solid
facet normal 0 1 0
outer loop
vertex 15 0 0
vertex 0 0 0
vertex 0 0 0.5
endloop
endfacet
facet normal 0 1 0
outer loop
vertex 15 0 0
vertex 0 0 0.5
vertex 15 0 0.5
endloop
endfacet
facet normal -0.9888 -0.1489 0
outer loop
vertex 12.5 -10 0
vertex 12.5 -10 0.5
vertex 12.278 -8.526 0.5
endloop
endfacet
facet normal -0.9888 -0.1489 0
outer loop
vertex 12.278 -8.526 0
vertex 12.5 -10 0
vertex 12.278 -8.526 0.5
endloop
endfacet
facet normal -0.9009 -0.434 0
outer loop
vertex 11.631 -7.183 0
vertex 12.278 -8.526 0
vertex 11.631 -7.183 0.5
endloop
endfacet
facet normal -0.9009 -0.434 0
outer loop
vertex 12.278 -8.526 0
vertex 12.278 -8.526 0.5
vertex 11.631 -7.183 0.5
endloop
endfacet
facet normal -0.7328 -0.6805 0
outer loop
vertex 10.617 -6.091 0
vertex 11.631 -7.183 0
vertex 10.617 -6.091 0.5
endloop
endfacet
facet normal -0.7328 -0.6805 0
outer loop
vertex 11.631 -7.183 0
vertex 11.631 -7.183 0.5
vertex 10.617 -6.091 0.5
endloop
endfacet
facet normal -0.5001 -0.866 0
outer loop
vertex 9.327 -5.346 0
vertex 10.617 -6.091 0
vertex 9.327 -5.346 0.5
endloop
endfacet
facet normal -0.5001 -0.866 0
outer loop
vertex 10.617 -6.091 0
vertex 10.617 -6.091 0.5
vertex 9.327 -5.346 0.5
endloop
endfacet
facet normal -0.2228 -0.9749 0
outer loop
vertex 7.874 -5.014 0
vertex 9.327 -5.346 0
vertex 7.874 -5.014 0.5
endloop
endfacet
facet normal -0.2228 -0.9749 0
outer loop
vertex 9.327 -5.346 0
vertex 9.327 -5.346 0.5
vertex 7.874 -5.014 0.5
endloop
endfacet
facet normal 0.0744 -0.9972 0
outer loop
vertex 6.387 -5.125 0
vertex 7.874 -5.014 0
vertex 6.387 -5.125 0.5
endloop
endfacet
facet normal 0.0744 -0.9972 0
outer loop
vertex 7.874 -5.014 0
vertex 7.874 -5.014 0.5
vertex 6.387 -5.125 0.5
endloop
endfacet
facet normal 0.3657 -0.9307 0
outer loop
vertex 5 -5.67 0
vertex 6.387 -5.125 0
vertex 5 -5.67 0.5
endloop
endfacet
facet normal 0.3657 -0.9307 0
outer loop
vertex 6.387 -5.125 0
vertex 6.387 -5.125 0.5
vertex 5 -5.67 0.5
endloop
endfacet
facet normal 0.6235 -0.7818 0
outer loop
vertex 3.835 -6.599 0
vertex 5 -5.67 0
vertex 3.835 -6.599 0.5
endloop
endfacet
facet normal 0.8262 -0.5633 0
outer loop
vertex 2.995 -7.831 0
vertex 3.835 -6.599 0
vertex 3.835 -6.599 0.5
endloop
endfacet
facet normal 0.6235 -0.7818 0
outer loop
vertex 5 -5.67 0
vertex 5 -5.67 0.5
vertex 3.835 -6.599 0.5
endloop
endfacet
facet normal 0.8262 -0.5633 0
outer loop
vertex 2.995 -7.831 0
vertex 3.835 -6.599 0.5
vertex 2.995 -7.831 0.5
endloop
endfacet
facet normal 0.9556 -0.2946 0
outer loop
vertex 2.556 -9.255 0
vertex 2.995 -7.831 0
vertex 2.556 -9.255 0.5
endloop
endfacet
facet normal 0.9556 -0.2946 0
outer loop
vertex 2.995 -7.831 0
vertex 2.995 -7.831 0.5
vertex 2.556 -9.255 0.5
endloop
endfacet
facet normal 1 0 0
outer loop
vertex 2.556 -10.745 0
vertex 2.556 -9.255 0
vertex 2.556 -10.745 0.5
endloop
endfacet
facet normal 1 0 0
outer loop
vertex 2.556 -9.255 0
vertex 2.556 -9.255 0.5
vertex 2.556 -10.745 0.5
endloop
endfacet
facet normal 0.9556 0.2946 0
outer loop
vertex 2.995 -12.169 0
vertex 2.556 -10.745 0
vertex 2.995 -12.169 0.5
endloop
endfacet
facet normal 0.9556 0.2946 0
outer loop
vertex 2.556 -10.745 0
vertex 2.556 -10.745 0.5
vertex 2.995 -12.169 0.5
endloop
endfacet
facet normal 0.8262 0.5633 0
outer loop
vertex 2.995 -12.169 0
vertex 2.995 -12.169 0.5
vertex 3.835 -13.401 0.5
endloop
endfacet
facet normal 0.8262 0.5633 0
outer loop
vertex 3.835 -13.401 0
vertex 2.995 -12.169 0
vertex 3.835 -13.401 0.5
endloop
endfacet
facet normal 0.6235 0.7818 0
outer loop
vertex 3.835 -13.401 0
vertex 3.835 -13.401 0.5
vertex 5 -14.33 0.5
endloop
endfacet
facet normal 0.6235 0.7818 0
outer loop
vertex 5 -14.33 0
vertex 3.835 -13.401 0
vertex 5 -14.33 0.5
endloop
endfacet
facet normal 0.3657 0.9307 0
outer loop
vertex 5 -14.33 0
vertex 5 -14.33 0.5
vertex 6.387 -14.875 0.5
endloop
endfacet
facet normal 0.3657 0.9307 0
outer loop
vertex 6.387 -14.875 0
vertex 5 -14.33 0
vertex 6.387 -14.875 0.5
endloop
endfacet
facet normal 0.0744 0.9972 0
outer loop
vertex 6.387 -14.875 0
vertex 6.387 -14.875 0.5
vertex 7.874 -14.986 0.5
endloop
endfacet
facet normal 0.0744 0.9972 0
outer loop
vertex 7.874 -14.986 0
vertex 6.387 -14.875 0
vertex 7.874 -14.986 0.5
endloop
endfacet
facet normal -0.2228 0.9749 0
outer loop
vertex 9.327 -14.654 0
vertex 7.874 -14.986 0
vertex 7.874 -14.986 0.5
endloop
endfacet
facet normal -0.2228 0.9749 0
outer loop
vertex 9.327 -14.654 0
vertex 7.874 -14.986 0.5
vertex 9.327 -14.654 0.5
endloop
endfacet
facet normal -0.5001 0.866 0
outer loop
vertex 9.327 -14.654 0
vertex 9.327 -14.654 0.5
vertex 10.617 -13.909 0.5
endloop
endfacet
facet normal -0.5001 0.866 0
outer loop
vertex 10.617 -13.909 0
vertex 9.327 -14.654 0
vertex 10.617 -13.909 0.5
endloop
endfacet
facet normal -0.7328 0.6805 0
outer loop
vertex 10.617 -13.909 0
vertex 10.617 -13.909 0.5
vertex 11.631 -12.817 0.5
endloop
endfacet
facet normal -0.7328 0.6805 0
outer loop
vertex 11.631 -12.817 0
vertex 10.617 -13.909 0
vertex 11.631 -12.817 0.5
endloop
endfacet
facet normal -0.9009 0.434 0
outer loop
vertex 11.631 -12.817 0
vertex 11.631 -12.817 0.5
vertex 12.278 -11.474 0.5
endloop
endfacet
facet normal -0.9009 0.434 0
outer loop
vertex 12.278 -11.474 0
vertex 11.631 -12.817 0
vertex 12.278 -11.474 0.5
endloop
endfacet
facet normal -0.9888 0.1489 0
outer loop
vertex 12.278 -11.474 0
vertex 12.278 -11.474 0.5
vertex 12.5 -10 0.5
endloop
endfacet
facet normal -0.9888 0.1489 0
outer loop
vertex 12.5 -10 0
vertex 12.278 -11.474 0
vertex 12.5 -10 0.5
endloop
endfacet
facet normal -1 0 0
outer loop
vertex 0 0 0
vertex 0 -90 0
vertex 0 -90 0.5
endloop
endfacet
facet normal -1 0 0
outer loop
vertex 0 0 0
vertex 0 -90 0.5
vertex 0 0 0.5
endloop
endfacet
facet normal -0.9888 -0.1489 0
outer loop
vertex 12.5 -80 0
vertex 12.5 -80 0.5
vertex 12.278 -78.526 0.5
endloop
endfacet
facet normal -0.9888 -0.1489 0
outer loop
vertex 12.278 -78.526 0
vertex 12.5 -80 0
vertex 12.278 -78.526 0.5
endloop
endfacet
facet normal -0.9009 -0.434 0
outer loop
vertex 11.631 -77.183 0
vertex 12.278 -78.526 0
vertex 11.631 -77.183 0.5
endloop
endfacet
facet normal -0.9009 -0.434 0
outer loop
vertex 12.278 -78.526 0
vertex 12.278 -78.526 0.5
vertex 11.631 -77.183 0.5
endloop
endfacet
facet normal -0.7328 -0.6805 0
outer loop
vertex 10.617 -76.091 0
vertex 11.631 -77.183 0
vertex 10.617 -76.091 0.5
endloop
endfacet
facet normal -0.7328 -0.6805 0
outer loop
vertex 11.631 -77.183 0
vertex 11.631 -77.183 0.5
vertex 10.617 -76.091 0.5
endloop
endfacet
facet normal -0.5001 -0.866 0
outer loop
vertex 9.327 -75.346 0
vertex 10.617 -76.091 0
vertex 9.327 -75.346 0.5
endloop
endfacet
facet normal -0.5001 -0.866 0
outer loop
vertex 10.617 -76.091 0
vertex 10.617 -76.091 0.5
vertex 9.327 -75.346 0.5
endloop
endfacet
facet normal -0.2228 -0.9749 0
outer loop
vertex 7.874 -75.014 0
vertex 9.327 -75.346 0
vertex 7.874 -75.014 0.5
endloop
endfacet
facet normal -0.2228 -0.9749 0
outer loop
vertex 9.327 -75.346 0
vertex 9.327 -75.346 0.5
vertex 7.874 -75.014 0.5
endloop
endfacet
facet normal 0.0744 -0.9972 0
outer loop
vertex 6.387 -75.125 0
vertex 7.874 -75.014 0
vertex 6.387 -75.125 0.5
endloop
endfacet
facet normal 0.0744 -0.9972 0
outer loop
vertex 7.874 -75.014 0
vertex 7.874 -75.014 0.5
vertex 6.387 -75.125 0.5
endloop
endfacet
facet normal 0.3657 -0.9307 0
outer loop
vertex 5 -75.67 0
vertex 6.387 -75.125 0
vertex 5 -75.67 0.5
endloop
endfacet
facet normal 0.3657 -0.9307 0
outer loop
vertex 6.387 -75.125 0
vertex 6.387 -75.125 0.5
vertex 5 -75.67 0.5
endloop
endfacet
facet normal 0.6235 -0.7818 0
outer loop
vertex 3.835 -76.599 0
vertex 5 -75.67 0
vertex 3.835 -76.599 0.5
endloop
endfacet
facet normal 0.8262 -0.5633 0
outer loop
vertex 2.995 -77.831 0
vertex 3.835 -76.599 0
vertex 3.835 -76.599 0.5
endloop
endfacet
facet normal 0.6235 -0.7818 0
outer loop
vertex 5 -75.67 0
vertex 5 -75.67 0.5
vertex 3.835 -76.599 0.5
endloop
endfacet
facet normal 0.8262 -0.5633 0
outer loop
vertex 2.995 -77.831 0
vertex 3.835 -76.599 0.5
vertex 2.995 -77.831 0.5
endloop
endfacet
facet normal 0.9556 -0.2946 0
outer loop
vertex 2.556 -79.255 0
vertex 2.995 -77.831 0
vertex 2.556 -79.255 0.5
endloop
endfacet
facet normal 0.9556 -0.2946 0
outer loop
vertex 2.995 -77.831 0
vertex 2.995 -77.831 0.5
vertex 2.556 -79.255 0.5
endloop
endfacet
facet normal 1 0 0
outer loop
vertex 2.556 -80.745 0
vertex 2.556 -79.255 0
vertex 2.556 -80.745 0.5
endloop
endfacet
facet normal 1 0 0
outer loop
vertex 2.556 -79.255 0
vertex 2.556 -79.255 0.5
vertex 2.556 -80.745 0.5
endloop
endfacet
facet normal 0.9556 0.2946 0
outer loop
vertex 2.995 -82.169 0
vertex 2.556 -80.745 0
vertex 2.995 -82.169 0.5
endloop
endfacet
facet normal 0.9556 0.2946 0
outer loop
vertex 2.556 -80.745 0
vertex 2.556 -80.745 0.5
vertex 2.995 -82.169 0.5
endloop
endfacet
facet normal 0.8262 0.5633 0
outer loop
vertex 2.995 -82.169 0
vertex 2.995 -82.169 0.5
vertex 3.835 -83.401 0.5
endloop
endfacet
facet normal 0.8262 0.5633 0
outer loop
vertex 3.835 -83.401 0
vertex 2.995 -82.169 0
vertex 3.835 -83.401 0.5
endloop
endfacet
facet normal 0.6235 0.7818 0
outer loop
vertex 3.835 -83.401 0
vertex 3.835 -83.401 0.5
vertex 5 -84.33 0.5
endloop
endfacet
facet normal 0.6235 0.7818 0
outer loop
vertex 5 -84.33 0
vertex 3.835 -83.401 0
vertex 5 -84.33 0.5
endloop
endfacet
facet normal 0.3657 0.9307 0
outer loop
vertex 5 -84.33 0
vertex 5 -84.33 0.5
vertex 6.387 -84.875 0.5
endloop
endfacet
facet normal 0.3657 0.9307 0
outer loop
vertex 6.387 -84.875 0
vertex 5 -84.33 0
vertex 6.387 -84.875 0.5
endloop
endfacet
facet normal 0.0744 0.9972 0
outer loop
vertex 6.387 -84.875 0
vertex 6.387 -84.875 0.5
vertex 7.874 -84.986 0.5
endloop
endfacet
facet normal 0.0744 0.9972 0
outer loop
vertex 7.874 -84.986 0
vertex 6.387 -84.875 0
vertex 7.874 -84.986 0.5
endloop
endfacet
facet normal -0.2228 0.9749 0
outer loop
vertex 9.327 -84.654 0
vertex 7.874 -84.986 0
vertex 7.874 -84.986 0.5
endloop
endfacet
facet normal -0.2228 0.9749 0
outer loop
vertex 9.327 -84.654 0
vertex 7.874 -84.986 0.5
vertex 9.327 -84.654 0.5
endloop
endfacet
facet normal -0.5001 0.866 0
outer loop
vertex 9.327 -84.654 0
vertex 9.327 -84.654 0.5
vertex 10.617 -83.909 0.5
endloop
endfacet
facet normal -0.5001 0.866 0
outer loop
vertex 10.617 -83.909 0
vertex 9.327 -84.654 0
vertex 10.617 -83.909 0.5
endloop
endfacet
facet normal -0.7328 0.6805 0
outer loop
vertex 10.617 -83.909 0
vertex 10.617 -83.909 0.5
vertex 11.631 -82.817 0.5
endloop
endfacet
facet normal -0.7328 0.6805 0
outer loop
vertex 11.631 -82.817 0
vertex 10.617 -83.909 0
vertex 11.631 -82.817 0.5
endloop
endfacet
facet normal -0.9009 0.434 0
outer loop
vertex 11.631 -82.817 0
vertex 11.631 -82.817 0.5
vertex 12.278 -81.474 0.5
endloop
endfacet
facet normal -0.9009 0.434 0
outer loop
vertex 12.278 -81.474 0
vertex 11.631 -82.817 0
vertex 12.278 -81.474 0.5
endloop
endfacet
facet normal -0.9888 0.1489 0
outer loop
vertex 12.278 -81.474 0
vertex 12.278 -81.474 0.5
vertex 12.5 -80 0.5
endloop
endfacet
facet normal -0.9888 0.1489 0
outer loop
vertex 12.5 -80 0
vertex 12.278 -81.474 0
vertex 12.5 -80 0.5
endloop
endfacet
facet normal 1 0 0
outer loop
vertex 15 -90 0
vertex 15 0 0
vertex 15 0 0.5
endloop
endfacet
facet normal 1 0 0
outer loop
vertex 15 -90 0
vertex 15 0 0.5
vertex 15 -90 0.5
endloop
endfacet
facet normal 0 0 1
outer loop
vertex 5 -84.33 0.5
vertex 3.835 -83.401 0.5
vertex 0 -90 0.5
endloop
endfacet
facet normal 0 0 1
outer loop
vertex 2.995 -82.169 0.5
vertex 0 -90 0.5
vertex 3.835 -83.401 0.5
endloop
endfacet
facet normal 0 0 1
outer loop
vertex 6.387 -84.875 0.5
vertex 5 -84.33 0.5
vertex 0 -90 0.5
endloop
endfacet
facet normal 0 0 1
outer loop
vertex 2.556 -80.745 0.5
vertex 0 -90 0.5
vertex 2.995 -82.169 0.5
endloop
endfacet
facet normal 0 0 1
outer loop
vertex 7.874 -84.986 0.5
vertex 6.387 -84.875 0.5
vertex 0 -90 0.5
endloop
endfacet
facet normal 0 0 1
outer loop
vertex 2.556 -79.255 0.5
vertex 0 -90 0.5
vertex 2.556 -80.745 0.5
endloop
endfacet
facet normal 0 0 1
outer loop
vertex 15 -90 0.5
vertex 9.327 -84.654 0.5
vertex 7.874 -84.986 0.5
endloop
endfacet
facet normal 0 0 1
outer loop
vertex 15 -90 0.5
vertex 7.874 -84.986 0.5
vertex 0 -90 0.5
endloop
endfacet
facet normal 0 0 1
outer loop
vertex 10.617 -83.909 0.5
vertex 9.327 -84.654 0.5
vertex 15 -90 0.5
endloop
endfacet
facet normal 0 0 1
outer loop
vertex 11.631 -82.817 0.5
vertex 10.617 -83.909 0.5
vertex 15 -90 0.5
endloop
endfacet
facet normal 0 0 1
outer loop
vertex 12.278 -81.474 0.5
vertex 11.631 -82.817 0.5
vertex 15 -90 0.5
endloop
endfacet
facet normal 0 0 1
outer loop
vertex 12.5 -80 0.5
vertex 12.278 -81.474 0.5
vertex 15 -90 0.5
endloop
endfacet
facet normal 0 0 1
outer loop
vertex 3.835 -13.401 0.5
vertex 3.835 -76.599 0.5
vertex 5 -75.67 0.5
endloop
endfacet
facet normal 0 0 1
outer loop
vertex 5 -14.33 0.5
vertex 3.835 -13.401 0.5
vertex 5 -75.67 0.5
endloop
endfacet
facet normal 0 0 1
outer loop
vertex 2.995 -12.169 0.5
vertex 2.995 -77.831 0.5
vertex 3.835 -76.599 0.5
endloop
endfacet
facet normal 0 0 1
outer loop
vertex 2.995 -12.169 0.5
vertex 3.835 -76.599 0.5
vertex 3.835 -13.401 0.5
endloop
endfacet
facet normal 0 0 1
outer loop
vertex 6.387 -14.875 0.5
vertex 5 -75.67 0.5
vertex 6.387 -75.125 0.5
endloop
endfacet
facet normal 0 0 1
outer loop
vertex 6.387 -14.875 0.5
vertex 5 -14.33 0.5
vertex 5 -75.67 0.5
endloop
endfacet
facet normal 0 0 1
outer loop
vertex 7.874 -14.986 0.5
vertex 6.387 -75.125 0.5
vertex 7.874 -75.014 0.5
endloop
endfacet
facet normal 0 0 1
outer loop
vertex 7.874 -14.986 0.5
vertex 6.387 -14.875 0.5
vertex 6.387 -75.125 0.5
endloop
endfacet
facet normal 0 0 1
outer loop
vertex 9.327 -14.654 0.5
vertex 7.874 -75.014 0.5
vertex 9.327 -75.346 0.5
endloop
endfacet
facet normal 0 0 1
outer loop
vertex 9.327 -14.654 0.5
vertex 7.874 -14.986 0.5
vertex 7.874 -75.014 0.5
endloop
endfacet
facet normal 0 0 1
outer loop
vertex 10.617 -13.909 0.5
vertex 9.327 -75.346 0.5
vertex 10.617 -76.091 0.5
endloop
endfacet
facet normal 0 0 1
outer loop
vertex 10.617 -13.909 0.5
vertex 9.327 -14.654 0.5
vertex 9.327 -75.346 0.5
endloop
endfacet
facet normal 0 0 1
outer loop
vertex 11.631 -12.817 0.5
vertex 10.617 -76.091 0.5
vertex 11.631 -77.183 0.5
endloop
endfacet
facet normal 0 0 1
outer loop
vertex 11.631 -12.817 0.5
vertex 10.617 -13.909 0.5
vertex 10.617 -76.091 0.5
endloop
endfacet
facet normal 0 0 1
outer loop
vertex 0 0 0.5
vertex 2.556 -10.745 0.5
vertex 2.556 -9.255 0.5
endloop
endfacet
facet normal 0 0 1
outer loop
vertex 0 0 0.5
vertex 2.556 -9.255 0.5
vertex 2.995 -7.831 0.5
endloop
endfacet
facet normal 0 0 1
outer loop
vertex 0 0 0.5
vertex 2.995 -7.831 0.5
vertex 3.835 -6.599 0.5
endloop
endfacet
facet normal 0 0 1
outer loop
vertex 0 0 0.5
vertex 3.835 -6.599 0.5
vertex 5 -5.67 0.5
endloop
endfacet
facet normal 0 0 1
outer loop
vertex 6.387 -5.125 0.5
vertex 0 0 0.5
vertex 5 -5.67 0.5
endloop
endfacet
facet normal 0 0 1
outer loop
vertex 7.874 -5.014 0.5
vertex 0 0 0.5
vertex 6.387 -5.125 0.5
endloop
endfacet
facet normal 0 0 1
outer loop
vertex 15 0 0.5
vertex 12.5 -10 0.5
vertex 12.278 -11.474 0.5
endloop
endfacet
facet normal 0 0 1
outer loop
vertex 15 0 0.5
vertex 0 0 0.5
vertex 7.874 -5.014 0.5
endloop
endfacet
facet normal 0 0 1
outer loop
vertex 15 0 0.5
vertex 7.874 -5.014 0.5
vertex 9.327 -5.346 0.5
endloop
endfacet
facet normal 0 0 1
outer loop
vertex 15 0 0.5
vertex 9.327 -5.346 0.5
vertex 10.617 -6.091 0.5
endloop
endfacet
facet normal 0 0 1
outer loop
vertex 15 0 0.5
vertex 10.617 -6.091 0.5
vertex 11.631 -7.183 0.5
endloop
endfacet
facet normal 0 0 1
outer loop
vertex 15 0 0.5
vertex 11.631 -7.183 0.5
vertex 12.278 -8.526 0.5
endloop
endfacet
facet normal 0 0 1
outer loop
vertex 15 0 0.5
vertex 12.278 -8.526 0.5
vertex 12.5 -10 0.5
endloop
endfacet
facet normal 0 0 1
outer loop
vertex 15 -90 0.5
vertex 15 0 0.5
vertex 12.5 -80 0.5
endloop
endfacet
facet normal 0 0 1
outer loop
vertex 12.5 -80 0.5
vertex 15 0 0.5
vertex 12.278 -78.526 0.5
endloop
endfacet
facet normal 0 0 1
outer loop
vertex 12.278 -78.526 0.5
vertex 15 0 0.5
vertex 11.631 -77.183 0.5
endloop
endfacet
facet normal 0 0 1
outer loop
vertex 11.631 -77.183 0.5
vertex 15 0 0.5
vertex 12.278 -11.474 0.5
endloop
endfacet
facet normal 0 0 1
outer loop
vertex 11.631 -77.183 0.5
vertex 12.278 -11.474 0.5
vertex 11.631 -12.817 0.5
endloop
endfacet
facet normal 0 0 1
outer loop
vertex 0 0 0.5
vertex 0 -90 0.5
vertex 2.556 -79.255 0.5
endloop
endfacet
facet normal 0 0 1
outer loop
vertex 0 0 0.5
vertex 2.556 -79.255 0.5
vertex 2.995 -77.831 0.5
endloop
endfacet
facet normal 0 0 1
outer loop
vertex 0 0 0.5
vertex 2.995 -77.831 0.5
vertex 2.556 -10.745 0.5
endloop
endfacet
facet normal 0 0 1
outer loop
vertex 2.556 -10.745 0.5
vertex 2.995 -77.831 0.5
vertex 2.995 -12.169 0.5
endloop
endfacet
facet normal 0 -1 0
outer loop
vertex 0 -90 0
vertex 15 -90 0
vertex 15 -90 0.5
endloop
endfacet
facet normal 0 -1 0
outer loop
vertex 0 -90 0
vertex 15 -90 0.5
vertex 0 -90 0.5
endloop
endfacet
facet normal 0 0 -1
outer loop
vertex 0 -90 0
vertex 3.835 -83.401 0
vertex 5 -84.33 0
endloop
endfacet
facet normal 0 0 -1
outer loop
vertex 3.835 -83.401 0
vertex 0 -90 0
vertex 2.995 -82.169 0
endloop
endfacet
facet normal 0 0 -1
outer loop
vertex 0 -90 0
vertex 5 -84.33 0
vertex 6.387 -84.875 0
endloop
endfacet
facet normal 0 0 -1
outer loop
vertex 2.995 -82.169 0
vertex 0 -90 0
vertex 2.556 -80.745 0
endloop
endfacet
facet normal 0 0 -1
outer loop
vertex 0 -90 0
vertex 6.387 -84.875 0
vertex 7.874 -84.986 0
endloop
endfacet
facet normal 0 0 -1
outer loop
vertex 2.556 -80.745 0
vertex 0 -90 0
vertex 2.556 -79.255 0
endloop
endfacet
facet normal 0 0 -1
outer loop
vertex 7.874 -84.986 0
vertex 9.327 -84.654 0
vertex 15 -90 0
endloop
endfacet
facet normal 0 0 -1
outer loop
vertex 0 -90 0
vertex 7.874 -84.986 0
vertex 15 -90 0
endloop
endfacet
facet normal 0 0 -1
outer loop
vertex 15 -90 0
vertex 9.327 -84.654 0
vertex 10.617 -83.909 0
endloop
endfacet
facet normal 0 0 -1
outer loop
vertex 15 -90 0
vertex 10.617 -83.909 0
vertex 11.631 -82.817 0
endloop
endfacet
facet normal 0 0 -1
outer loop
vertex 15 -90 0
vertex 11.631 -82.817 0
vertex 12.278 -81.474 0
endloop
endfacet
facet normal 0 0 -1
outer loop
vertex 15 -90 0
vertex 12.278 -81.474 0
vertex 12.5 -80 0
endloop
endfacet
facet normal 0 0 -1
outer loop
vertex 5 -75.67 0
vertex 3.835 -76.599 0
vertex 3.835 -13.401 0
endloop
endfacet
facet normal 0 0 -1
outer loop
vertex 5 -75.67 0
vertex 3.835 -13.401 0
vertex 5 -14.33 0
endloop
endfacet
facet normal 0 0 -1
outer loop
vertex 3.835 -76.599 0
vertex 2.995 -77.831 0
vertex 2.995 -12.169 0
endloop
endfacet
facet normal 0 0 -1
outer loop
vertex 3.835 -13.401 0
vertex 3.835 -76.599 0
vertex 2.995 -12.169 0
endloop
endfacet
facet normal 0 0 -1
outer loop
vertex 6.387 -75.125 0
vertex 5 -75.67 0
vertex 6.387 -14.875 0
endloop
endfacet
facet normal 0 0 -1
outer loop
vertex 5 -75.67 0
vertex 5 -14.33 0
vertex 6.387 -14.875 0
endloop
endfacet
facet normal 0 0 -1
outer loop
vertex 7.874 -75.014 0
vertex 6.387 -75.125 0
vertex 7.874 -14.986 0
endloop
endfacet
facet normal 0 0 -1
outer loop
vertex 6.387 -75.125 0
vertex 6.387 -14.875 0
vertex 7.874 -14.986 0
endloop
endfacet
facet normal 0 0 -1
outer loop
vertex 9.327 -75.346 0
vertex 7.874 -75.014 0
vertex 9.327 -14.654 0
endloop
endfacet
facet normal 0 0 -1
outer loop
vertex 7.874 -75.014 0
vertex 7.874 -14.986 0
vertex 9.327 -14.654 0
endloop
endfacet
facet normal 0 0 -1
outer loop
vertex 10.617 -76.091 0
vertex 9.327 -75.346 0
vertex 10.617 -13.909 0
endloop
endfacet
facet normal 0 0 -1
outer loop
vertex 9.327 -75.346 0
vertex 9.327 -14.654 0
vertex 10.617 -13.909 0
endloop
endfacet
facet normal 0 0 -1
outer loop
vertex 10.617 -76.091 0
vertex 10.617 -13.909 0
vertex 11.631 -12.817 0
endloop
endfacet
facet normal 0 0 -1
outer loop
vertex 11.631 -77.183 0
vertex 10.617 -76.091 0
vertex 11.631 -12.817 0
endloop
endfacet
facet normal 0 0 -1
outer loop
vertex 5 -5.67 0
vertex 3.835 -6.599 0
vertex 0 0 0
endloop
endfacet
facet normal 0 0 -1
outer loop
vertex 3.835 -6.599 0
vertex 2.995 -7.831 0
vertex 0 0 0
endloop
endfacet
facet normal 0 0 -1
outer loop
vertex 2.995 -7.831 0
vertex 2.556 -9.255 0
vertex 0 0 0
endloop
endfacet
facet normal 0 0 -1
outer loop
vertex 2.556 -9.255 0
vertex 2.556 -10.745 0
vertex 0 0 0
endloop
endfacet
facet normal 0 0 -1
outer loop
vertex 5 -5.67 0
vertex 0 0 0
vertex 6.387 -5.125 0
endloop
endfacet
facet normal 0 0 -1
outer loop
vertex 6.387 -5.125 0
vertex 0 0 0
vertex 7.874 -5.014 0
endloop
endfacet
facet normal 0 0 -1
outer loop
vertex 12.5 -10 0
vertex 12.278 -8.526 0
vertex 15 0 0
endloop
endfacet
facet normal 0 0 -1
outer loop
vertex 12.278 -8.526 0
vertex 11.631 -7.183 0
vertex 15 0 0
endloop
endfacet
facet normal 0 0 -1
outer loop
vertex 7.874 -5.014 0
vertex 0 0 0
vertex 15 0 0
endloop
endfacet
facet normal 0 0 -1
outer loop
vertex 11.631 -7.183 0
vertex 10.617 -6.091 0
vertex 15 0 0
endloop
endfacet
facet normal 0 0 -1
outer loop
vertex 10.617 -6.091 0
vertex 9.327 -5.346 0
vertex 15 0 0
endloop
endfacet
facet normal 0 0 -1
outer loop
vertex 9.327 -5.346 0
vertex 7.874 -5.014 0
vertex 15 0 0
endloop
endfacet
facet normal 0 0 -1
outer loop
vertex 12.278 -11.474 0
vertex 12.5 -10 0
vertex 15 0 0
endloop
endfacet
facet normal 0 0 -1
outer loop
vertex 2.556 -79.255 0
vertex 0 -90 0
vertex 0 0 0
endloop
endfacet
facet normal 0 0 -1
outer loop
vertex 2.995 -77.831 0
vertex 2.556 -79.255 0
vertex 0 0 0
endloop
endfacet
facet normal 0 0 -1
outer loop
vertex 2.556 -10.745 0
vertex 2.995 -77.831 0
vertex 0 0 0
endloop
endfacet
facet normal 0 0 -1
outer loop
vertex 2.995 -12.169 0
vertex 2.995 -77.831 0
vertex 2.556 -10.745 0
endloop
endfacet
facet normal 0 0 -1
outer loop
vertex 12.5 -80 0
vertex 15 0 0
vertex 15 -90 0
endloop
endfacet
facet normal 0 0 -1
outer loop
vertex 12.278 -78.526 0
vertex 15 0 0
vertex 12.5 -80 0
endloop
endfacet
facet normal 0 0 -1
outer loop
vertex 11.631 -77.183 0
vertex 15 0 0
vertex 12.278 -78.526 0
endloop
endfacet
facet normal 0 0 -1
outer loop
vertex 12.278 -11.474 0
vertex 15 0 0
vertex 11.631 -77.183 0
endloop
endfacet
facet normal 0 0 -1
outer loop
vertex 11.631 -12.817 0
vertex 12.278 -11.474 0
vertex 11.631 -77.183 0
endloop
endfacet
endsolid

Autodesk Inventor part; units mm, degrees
ref_plane "YZ Plane" through (0, 0, 0) normal (1, 0, 0) x (0, 1, 0)
ref_plane "XZ Plane" through (0, 0, 0) normal (0, 1, 0) x (-1, 0, 0)
ref_plane "XY Plane" through (0, 0, 0) normal (0, 0, 1) x (1, 0, 0)
sketch "Sketch1" plane through (0, 0, 0) normal (0, 0, 1) x (1, 0, 0)
  line L0 (0, 0) -> (15, 0)
  line L1 (15, 0) -> (15, -90)
  line L2 (15, -90) -> (0, -90)
  line L3 (0, -90) -> (0, 0)
  dimension "d0" = 15
  dimension "d1" = 90
extrude "Plate1" add sketch "Sketch1" along normal blind 0.5
sketch "Sketch2" plane through (0, 0, 0.5) normal (0, 0, 1) x (1, 0, 0)
  line L0 (0, 0) -> (15, 0) projected
  line L1 (7.5, 0) -> (7.5, -10)
  circle A0 centre (7.5, -10) radius 5
  line L2 (15, -90) -> (0, -90) projected
  line L3 (7.5, -90) -> (7.5, -80)
  circle A1 centre (7.5, -80) radius 5
  dimension "d3" = 10
  dimension "d4" = 10
  dimension "d5" = 10
  dimension "d6" = 10
extrude "Extrusion1" cut sketch "Sketch2" against normal blind 10
equation "\"d2\" = Thickness"
equation "\"BendRadius\" = Thickness"
equation "\"BendReliefWidth\" = Thickness"
equation "\"BendReliefDepth\" = 0.5 * Thickness"
equation "\"CornerReliefSize\" = 4 * Thickness"
equation "\"MinimumRemnant\" = 2 * Thickness"
equation "\"TransitionRadius\" = BendRadius"
equation "\"JacobiRadiusSize\" = BendRadius"
equation "\"GapSize\" = Thickness"
equation "\"Thickness\" = 0.5"
properties part number "shaft for capping system"
